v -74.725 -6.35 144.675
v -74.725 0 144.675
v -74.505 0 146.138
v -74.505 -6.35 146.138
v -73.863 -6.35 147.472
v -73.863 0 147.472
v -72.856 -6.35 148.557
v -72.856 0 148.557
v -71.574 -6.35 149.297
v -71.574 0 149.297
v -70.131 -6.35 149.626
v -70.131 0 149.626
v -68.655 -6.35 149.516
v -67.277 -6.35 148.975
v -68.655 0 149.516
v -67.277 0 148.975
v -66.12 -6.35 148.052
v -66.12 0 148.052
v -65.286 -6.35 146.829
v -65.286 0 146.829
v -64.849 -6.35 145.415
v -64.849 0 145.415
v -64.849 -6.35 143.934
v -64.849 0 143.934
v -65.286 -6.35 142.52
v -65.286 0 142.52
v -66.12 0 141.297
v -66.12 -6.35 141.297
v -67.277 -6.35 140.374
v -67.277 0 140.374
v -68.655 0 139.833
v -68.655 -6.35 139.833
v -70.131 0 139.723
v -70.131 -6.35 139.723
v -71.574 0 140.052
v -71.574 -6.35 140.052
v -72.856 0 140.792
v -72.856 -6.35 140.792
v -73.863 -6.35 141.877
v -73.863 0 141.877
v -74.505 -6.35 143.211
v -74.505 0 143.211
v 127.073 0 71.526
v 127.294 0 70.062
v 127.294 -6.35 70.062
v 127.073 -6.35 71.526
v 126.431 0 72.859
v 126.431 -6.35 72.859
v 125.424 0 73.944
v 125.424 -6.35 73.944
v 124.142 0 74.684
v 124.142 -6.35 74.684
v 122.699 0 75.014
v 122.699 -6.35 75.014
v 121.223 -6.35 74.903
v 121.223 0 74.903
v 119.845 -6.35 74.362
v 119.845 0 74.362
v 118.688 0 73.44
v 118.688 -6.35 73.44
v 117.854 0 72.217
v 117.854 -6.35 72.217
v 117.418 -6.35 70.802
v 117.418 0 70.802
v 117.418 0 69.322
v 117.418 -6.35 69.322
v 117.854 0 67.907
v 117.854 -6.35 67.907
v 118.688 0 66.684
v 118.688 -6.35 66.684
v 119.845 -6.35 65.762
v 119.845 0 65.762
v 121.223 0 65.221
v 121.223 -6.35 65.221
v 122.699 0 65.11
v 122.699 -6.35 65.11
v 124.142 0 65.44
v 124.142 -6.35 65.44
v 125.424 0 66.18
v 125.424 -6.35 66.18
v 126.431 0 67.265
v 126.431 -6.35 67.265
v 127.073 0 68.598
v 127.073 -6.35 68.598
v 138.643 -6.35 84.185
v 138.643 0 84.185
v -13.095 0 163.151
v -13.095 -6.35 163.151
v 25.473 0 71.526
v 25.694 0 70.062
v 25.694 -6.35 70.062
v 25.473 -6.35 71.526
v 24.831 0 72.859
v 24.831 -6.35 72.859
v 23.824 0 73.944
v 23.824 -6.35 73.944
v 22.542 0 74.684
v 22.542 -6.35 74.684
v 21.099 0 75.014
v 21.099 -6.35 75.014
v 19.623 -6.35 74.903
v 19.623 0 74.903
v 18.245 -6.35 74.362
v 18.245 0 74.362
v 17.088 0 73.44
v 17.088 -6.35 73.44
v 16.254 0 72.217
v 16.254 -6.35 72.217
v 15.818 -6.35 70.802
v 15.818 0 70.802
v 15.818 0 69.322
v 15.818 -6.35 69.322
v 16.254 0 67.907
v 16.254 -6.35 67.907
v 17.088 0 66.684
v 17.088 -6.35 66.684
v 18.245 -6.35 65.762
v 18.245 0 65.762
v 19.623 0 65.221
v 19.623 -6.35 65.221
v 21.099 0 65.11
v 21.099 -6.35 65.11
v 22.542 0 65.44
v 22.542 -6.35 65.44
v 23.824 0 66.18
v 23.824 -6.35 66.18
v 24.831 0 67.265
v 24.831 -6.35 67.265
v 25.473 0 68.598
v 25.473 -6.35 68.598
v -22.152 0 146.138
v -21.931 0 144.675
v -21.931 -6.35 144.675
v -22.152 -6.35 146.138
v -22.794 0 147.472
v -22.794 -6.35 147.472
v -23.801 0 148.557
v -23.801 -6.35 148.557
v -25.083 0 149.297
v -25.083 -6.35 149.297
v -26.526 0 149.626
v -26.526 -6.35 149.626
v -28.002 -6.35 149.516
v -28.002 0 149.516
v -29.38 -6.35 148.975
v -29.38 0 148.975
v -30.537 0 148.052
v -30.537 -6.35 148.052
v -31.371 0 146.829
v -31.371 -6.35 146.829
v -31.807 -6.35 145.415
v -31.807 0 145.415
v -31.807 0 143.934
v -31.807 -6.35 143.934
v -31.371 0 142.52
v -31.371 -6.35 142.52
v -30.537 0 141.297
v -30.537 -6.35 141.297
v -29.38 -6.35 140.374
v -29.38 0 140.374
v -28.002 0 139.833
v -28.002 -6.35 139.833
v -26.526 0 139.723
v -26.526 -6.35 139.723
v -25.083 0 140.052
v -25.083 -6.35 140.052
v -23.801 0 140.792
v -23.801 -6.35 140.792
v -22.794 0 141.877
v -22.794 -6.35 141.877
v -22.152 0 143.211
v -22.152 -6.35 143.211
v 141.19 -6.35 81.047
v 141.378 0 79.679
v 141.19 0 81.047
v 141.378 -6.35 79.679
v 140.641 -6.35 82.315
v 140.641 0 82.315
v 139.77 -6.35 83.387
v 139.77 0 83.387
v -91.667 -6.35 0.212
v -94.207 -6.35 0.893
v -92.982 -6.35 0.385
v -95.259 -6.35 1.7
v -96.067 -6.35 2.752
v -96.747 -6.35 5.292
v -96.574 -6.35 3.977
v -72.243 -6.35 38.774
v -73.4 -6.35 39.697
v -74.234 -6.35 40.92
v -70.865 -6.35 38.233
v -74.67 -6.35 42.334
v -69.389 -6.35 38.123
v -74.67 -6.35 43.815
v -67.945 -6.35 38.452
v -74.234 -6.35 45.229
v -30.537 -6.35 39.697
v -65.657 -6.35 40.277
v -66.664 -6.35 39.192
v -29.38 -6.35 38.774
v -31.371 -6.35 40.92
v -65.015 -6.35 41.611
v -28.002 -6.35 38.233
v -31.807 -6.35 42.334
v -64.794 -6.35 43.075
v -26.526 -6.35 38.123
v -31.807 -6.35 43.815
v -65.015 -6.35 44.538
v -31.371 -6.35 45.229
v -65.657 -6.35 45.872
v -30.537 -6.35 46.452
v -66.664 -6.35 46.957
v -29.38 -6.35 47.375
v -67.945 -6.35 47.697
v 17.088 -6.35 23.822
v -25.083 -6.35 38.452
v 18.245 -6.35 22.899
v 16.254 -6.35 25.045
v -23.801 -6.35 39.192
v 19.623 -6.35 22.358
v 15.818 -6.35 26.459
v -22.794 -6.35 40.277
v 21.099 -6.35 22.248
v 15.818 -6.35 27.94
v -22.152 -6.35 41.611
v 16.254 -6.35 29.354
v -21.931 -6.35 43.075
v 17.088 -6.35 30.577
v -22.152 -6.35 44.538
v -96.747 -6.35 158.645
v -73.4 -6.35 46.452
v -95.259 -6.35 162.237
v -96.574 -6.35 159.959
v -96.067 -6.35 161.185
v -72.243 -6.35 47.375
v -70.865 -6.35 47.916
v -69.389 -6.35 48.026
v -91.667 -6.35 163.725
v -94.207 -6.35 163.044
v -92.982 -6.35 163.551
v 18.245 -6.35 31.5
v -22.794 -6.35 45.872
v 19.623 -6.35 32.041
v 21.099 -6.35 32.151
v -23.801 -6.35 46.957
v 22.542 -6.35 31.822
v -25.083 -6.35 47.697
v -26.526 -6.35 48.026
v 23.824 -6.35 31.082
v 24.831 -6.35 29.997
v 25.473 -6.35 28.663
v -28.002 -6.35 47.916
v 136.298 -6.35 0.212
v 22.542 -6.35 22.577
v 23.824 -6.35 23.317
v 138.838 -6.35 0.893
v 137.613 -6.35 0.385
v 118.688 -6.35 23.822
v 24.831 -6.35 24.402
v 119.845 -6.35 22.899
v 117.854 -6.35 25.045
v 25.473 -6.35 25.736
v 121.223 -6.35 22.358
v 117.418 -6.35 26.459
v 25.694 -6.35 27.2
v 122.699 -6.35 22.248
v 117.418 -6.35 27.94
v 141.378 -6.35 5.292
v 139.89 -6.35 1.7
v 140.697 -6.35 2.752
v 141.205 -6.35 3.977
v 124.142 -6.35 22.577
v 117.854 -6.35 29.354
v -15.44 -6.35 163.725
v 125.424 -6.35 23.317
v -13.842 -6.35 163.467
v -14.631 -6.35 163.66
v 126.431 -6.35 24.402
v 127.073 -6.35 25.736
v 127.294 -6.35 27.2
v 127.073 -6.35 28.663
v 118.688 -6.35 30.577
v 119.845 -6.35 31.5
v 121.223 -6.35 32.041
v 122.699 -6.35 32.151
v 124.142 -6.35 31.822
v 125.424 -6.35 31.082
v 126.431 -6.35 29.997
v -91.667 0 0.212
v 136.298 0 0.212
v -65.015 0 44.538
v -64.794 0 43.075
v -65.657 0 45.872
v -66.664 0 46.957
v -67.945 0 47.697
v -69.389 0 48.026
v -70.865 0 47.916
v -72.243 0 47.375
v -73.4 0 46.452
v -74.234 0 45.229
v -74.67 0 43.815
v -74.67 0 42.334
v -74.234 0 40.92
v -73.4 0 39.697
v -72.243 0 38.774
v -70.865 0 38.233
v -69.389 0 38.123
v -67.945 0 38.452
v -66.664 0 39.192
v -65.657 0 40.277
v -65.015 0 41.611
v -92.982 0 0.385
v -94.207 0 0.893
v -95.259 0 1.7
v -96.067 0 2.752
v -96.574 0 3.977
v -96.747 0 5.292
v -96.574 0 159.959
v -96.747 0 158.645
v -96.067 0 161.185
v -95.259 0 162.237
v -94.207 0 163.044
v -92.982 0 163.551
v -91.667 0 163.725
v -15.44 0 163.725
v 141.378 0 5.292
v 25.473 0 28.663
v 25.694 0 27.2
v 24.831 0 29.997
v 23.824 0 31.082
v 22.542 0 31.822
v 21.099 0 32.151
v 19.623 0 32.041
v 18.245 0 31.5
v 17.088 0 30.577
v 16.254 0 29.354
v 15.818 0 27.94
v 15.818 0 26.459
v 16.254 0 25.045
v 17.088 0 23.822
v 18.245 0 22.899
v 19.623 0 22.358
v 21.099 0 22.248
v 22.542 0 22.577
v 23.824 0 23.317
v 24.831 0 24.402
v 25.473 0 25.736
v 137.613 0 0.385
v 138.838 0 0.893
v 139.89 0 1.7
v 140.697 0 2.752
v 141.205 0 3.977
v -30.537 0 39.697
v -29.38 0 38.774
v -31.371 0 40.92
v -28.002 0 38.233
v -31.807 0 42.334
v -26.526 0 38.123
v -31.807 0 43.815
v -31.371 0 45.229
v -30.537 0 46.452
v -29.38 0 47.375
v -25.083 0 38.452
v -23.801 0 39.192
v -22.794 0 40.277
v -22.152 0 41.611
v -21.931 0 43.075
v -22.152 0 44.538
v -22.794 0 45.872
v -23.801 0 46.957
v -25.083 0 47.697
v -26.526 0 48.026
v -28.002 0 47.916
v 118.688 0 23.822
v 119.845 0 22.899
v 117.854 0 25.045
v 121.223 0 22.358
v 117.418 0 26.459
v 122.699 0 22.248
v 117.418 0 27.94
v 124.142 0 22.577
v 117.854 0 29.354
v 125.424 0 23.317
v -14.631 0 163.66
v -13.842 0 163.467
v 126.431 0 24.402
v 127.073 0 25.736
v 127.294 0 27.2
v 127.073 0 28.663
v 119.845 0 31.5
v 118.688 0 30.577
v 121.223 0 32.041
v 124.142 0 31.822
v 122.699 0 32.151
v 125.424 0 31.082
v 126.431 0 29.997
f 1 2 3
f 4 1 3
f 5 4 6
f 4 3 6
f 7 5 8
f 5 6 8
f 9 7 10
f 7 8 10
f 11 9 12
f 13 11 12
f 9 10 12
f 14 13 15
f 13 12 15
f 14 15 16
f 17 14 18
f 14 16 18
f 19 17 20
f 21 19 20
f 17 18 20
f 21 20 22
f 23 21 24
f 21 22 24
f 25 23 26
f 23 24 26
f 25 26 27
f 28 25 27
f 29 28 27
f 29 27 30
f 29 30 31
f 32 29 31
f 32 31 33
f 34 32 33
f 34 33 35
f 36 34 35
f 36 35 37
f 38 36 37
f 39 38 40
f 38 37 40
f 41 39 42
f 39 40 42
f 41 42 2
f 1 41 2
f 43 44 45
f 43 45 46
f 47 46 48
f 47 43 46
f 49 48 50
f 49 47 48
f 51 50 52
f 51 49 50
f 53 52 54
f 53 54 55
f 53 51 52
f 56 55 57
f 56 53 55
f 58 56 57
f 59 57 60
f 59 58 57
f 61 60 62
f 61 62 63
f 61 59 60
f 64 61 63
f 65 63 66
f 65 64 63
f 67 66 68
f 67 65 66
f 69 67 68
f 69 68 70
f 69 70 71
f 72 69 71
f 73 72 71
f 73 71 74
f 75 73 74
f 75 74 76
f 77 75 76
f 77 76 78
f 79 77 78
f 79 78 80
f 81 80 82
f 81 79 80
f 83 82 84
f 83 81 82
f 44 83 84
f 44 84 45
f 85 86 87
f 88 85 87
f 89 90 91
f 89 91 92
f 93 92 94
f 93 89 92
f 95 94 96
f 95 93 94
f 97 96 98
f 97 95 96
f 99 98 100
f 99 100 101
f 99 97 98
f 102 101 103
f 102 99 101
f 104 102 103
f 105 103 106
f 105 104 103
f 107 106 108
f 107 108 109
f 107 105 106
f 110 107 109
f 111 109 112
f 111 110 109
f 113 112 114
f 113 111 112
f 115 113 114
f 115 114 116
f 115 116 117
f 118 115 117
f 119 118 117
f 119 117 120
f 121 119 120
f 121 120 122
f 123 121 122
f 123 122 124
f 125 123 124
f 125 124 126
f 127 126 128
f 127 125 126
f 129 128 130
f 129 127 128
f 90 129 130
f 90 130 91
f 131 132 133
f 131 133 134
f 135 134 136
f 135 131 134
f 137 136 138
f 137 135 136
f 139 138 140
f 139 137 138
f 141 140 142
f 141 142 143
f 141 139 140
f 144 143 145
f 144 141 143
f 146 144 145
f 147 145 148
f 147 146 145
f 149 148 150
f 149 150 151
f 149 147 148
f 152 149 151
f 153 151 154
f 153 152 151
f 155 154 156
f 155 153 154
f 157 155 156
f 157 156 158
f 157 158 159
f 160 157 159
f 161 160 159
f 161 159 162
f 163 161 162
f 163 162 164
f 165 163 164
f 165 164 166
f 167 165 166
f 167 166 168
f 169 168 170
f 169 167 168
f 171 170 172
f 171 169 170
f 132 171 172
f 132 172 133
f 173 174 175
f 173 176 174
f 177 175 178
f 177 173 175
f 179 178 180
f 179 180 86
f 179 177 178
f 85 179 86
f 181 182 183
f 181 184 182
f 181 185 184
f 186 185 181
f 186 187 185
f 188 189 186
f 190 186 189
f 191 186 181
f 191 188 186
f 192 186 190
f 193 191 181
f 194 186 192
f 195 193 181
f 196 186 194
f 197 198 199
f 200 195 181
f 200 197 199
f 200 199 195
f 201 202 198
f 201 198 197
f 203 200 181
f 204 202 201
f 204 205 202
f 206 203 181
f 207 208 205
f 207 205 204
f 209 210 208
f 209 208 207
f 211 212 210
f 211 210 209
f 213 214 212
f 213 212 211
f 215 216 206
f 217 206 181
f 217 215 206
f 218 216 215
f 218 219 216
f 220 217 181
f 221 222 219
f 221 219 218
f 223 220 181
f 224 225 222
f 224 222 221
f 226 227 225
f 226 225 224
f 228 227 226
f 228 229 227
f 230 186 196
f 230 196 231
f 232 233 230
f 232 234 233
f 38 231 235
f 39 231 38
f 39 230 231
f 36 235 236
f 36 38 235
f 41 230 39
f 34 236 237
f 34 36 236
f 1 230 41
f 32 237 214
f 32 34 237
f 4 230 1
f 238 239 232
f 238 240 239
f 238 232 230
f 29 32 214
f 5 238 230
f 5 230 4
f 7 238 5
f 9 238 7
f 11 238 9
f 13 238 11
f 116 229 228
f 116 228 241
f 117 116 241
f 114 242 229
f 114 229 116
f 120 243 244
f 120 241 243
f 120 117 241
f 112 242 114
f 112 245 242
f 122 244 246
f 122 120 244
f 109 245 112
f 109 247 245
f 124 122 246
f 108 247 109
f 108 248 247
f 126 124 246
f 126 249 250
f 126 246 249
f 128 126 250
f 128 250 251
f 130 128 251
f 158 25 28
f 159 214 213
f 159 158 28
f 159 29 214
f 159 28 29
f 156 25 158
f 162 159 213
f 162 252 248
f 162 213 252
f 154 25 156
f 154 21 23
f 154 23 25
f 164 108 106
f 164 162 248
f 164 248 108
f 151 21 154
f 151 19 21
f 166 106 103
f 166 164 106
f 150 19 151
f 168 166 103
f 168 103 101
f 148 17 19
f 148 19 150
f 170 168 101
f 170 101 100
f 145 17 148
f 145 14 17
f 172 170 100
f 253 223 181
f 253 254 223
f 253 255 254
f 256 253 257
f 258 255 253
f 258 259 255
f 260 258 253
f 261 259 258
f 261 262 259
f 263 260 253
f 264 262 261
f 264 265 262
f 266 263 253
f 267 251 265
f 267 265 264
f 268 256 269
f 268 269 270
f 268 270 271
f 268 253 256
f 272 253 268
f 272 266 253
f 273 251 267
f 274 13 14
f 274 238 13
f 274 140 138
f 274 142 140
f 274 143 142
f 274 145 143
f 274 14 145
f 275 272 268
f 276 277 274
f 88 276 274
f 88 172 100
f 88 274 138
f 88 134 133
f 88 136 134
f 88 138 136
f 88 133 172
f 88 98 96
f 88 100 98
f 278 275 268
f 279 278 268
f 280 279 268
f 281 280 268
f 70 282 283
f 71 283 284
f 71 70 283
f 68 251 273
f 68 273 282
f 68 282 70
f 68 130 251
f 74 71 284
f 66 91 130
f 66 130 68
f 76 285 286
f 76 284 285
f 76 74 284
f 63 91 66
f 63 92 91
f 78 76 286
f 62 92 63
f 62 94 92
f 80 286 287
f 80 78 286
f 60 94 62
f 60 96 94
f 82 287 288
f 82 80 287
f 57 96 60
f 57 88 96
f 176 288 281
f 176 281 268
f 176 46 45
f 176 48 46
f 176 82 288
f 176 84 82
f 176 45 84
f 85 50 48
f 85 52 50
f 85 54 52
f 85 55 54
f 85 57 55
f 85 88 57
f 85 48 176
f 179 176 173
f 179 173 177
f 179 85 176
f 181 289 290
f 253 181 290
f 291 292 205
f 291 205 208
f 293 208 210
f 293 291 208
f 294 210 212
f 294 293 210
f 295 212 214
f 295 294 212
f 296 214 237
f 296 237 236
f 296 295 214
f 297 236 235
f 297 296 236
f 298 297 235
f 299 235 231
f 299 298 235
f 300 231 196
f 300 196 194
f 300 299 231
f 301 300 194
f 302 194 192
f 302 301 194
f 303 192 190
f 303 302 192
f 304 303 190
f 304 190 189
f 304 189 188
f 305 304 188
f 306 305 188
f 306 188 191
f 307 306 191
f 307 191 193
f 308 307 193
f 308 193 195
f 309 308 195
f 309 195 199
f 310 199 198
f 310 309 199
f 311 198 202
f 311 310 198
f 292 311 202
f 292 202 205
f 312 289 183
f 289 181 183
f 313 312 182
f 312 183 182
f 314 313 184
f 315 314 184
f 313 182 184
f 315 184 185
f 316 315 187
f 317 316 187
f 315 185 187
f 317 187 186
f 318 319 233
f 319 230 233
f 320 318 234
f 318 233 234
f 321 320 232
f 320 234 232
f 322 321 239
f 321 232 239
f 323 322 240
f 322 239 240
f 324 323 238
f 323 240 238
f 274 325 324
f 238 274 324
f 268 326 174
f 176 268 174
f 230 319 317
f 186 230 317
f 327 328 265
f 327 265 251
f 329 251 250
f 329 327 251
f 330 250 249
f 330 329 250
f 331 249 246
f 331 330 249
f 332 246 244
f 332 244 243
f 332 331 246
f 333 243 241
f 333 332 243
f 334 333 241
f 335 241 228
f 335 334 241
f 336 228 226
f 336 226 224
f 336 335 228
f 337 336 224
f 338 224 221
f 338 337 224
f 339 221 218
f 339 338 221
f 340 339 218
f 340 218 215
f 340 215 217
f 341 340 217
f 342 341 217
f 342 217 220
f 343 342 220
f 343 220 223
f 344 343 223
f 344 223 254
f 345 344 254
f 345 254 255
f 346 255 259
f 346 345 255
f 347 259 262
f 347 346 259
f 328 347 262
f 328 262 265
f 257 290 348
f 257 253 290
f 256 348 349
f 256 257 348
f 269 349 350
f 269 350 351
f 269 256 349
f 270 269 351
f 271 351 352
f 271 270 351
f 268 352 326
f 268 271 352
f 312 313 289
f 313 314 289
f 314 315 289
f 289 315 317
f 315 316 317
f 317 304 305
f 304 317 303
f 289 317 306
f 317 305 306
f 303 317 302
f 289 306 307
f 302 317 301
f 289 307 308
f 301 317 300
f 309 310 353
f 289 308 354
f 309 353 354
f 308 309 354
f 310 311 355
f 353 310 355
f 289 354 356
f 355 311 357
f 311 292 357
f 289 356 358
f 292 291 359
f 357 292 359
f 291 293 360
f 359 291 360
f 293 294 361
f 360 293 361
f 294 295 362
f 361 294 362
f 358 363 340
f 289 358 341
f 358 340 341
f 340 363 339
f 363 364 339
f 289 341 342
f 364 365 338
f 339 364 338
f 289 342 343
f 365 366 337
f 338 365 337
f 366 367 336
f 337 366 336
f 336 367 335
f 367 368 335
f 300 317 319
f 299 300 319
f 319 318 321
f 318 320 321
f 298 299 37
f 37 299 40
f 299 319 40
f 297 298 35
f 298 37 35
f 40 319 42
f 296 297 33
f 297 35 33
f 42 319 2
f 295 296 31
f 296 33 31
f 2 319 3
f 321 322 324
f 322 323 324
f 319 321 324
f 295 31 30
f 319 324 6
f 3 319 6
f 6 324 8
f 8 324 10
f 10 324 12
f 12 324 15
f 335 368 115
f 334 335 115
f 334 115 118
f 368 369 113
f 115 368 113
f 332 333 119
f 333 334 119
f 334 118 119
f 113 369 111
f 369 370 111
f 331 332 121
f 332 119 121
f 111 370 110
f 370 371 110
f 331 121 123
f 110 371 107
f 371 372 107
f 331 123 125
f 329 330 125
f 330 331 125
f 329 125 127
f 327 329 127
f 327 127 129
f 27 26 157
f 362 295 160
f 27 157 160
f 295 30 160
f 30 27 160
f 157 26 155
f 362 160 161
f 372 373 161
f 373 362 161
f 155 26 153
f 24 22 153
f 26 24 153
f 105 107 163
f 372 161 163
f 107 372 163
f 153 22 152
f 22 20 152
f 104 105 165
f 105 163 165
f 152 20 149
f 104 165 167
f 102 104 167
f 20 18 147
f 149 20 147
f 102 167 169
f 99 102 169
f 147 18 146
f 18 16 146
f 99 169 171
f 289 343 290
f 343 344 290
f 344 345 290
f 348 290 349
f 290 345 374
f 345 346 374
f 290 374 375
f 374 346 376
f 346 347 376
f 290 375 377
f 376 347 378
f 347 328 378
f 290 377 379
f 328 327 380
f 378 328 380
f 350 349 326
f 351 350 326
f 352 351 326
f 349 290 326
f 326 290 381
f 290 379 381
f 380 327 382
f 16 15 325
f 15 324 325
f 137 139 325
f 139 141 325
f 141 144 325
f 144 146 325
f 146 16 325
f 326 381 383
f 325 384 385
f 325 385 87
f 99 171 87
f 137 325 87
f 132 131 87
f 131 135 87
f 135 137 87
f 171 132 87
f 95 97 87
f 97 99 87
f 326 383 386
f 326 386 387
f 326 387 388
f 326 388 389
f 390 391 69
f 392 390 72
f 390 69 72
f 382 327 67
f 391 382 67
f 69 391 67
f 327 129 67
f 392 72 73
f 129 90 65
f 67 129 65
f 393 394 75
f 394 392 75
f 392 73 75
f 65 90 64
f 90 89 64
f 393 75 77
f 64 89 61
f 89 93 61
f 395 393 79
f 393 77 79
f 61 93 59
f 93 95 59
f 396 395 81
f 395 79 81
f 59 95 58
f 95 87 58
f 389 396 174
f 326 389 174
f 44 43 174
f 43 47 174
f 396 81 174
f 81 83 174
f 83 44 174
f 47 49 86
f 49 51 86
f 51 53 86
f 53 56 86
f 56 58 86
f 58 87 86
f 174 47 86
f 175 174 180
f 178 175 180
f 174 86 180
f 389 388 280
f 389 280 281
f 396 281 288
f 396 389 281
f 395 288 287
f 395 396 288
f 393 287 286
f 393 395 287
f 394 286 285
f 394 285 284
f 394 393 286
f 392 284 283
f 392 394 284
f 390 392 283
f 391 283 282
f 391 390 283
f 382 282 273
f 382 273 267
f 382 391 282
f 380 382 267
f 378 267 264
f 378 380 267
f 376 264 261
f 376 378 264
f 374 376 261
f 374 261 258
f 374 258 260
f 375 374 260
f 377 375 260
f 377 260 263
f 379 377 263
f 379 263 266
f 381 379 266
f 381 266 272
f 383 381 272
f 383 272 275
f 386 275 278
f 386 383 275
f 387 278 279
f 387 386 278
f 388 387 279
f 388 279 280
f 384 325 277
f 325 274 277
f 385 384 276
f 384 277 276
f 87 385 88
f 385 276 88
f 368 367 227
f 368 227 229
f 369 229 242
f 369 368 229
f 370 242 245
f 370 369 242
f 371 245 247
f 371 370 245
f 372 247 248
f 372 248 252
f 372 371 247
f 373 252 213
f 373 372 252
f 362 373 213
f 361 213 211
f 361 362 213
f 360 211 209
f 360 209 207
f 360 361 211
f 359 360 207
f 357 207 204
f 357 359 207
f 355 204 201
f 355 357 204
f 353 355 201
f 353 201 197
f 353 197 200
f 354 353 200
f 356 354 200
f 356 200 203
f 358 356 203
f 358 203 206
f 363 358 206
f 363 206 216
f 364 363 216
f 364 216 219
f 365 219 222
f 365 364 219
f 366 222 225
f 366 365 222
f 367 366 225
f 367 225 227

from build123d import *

# Parameters (mm, degrees)
F0_R     = 4.9657
F1_DEPTH = 6.35
F2_R     = 5.08


# Not quite as in the source:
# - a feature names something its author has since deleted; it is built from what else it names


with BuildPart() as f1:
    # F0 (on Front) → F1 (new body)
    with BuildSketch(Plane.XZ):
        Polygon((-96.7471700311, 0.2120000629), (141.3778299689, 0.2120000629), (141.3778299689, 82.7620000629), (-14.1971700311, 163.7245000629), (-96.7471700311, 163.7245000629), (-96.7471700311, 144.6745000629), align=None)
        with Locations((20.7278299689, 27.1995000629)):
            Circle(F0_R, mode=Mode.SUBTRACT)
        with Locations((-69.7596700311, 43.0745000629)):
            Circle(F0_R, mode=Mode.SUBTRACT)
        with Locations((-26.8971700311, 43.0745000629)):
            Circle(F0_R, mode=Mode.SUBTRACT)
        with Locations((20.7278299689, 70.0620000629)):
            Circle(F0_R, mode=Mode.SUBTRACT)
        with Locations((122.3278299689, 27.1995000629)):
            Circle(F0_R, mode=Mode.SUBTRACT)
        with Locations((122.3278299689, 70.0620000629)):
            Circle(F0_R, mode=Mode.SUBTRACT)
        with BuildLine():
            ThreePointArc((-64.7939700311, 144.6745000629), (-69.7596700311, 139.7088000629), (-74.7253700311, 144.6745000629))
            ThreePointArc((-74.7253700311, 144.6745000629), (-69.7596700311, 149.6402000629), (-64.7939700311, 144.6745000629))
        make_face(mode=Mode.SUBTRACT)
        with Locations((-26.8971700311, 144.6745000629)):
            Circle(F0_R, mode=Mode.SUBTRACT)
    extrude(amount=F1_DEPTH)

    # F2
    f2_edges = [f1.edges().sort_by_distance(p)[0] for p in [
        (-96.74717, -3.175, 0.212),
        (-96.74717, -3.175, 163.7245),
        (-14.19717, -3.175, 163.7245),
        (141.37783, -3.175, 82.762),
        (141.37783, -3.175, 0.212),
    ]]
    fillet(f2_edges, radius=F2_R)


solid = f1.part
